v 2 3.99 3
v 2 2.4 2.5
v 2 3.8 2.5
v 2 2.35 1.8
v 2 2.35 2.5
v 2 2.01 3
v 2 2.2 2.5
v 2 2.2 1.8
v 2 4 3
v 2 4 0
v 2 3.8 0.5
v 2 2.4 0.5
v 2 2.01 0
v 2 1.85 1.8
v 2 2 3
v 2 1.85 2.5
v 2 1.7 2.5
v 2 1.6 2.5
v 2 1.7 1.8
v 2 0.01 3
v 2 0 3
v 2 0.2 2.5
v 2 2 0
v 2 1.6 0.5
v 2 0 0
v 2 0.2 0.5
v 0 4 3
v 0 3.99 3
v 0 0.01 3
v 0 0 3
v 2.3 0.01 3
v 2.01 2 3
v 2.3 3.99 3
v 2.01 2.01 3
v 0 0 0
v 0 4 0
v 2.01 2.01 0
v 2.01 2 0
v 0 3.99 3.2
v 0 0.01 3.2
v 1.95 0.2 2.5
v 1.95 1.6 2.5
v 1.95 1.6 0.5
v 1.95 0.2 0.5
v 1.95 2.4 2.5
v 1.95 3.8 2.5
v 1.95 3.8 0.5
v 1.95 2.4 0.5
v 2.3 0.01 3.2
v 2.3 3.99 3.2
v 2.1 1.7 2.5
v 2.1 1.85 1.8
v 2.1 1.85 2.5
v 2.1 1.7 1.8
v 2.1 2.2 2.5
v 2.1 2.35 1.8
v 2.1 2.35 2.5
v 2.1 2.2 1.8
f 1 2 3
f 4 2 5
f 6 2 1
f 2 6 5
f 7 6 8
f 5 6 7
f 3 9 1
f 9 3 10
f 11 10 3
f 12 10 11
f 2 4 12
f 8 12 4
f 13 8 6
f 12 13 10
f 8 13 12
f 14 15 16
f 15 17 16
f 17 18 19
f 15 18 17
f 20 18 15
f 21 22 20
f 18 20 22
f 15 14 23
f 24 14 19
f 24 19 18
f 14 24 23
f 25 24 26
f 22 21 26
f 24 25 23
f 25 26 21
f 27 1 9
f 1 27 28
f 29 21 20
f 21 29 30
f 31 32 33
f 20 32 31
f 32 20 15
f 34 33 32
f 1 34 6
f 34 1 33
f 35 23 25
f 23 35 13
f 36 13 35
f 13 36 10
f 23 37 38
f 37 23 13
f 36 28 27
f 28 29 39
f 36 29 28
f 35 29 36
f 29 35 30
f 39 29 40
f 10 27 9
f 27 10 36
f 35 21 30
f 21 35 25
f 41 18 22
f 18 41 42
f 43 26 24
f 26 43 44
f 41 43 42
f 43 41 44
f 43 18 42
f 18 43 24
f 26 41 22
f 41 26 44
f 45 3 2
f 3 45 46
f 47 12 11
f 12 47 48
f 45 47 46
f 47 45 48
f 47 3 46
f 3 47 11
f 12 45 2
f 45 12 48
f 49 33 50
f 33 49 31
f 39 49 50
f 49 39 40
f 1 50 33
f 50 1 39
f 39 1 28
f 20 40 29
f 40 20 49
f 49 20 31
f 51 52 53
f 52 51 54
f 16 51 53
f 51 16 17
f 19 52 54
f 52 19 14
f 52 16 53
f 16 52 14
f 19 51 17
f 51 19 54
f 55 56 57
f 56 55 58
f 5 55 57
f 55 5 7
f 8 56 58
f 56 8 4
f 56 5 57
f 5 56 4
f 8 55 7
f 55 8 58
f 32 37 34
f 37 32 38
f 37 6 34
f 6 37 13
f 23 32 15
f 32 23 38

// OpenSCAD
module Base_cabinet_02(){

    translate([0,0.01,3])
    color("#8b6914")
    cube([2.3,3.98,0.2]);

    difference(){
        color("#cdaa7d")
        cube([2,4,3]);

        translate([1.95,0.2,0.5])
        color("#cdaa6f")
        cube([0.1,1.4,2]);

        translate([1.95 ,2.4,0.5])
        color("#cdaa6f")
        cube([0.1,1.4,2]);
    }

    translate([2,1.7,1.8])
    color("#8b6914")
    cube([0.1,0.15,0.7]);

    translate([2,2.2,1.8])
    color("#8b6914")
    cube([0.1,0.15,0.7]);

    translate([2,2,0])
    color("#000000")
    cube([0.01,0.01,3]);

}

Base_cabinet_02();

// Written by Nicolì Angelo (Gengio) 2024: 
// MIT License


//Permission is hereby granted, free of charge, to any person obtaining a copy of this software and associated documentation files (the "Software"), to deal in the Software without restriction, including without limitation the rights to use, copy, modify, merge, publish, distribute, sublicense, and/or sell copies of the Software, and to permit persons to whom the Software is furnished to do so, subject to the following conditions:

//The above copyright notice and this permission notice shall be included in all copies or substantial portions of the Software.

//THE SOFTWARE IS PROVIDED "AS IS", WITHOUT WARRANTY OF ANY KIND, EXPRESS OR IMPLIED, INCLUDING BUT NOT LIMITED TO THE WARRANTIES OF MERCHANTABILITY, FITNESS FOR A PARTICULAR PURPOSE AND NONINFRINGEMENT. IN NO EVENT SHALL THE AUTHORS OR COPYRIGHT HOLDERS BE LIABLE FOR ANY CLAIM, DAMAGES OR OTHER LIABILITY, WHETHER IN AN ACTION OF CONTRACT, TORT OR OTHERWISE, ARISING FROM, OUT OF OR IN CONNECTION WITH THE SOFTWARE OR THE USE OR OTHER DEALINGS IN THE SOFTWARE.
